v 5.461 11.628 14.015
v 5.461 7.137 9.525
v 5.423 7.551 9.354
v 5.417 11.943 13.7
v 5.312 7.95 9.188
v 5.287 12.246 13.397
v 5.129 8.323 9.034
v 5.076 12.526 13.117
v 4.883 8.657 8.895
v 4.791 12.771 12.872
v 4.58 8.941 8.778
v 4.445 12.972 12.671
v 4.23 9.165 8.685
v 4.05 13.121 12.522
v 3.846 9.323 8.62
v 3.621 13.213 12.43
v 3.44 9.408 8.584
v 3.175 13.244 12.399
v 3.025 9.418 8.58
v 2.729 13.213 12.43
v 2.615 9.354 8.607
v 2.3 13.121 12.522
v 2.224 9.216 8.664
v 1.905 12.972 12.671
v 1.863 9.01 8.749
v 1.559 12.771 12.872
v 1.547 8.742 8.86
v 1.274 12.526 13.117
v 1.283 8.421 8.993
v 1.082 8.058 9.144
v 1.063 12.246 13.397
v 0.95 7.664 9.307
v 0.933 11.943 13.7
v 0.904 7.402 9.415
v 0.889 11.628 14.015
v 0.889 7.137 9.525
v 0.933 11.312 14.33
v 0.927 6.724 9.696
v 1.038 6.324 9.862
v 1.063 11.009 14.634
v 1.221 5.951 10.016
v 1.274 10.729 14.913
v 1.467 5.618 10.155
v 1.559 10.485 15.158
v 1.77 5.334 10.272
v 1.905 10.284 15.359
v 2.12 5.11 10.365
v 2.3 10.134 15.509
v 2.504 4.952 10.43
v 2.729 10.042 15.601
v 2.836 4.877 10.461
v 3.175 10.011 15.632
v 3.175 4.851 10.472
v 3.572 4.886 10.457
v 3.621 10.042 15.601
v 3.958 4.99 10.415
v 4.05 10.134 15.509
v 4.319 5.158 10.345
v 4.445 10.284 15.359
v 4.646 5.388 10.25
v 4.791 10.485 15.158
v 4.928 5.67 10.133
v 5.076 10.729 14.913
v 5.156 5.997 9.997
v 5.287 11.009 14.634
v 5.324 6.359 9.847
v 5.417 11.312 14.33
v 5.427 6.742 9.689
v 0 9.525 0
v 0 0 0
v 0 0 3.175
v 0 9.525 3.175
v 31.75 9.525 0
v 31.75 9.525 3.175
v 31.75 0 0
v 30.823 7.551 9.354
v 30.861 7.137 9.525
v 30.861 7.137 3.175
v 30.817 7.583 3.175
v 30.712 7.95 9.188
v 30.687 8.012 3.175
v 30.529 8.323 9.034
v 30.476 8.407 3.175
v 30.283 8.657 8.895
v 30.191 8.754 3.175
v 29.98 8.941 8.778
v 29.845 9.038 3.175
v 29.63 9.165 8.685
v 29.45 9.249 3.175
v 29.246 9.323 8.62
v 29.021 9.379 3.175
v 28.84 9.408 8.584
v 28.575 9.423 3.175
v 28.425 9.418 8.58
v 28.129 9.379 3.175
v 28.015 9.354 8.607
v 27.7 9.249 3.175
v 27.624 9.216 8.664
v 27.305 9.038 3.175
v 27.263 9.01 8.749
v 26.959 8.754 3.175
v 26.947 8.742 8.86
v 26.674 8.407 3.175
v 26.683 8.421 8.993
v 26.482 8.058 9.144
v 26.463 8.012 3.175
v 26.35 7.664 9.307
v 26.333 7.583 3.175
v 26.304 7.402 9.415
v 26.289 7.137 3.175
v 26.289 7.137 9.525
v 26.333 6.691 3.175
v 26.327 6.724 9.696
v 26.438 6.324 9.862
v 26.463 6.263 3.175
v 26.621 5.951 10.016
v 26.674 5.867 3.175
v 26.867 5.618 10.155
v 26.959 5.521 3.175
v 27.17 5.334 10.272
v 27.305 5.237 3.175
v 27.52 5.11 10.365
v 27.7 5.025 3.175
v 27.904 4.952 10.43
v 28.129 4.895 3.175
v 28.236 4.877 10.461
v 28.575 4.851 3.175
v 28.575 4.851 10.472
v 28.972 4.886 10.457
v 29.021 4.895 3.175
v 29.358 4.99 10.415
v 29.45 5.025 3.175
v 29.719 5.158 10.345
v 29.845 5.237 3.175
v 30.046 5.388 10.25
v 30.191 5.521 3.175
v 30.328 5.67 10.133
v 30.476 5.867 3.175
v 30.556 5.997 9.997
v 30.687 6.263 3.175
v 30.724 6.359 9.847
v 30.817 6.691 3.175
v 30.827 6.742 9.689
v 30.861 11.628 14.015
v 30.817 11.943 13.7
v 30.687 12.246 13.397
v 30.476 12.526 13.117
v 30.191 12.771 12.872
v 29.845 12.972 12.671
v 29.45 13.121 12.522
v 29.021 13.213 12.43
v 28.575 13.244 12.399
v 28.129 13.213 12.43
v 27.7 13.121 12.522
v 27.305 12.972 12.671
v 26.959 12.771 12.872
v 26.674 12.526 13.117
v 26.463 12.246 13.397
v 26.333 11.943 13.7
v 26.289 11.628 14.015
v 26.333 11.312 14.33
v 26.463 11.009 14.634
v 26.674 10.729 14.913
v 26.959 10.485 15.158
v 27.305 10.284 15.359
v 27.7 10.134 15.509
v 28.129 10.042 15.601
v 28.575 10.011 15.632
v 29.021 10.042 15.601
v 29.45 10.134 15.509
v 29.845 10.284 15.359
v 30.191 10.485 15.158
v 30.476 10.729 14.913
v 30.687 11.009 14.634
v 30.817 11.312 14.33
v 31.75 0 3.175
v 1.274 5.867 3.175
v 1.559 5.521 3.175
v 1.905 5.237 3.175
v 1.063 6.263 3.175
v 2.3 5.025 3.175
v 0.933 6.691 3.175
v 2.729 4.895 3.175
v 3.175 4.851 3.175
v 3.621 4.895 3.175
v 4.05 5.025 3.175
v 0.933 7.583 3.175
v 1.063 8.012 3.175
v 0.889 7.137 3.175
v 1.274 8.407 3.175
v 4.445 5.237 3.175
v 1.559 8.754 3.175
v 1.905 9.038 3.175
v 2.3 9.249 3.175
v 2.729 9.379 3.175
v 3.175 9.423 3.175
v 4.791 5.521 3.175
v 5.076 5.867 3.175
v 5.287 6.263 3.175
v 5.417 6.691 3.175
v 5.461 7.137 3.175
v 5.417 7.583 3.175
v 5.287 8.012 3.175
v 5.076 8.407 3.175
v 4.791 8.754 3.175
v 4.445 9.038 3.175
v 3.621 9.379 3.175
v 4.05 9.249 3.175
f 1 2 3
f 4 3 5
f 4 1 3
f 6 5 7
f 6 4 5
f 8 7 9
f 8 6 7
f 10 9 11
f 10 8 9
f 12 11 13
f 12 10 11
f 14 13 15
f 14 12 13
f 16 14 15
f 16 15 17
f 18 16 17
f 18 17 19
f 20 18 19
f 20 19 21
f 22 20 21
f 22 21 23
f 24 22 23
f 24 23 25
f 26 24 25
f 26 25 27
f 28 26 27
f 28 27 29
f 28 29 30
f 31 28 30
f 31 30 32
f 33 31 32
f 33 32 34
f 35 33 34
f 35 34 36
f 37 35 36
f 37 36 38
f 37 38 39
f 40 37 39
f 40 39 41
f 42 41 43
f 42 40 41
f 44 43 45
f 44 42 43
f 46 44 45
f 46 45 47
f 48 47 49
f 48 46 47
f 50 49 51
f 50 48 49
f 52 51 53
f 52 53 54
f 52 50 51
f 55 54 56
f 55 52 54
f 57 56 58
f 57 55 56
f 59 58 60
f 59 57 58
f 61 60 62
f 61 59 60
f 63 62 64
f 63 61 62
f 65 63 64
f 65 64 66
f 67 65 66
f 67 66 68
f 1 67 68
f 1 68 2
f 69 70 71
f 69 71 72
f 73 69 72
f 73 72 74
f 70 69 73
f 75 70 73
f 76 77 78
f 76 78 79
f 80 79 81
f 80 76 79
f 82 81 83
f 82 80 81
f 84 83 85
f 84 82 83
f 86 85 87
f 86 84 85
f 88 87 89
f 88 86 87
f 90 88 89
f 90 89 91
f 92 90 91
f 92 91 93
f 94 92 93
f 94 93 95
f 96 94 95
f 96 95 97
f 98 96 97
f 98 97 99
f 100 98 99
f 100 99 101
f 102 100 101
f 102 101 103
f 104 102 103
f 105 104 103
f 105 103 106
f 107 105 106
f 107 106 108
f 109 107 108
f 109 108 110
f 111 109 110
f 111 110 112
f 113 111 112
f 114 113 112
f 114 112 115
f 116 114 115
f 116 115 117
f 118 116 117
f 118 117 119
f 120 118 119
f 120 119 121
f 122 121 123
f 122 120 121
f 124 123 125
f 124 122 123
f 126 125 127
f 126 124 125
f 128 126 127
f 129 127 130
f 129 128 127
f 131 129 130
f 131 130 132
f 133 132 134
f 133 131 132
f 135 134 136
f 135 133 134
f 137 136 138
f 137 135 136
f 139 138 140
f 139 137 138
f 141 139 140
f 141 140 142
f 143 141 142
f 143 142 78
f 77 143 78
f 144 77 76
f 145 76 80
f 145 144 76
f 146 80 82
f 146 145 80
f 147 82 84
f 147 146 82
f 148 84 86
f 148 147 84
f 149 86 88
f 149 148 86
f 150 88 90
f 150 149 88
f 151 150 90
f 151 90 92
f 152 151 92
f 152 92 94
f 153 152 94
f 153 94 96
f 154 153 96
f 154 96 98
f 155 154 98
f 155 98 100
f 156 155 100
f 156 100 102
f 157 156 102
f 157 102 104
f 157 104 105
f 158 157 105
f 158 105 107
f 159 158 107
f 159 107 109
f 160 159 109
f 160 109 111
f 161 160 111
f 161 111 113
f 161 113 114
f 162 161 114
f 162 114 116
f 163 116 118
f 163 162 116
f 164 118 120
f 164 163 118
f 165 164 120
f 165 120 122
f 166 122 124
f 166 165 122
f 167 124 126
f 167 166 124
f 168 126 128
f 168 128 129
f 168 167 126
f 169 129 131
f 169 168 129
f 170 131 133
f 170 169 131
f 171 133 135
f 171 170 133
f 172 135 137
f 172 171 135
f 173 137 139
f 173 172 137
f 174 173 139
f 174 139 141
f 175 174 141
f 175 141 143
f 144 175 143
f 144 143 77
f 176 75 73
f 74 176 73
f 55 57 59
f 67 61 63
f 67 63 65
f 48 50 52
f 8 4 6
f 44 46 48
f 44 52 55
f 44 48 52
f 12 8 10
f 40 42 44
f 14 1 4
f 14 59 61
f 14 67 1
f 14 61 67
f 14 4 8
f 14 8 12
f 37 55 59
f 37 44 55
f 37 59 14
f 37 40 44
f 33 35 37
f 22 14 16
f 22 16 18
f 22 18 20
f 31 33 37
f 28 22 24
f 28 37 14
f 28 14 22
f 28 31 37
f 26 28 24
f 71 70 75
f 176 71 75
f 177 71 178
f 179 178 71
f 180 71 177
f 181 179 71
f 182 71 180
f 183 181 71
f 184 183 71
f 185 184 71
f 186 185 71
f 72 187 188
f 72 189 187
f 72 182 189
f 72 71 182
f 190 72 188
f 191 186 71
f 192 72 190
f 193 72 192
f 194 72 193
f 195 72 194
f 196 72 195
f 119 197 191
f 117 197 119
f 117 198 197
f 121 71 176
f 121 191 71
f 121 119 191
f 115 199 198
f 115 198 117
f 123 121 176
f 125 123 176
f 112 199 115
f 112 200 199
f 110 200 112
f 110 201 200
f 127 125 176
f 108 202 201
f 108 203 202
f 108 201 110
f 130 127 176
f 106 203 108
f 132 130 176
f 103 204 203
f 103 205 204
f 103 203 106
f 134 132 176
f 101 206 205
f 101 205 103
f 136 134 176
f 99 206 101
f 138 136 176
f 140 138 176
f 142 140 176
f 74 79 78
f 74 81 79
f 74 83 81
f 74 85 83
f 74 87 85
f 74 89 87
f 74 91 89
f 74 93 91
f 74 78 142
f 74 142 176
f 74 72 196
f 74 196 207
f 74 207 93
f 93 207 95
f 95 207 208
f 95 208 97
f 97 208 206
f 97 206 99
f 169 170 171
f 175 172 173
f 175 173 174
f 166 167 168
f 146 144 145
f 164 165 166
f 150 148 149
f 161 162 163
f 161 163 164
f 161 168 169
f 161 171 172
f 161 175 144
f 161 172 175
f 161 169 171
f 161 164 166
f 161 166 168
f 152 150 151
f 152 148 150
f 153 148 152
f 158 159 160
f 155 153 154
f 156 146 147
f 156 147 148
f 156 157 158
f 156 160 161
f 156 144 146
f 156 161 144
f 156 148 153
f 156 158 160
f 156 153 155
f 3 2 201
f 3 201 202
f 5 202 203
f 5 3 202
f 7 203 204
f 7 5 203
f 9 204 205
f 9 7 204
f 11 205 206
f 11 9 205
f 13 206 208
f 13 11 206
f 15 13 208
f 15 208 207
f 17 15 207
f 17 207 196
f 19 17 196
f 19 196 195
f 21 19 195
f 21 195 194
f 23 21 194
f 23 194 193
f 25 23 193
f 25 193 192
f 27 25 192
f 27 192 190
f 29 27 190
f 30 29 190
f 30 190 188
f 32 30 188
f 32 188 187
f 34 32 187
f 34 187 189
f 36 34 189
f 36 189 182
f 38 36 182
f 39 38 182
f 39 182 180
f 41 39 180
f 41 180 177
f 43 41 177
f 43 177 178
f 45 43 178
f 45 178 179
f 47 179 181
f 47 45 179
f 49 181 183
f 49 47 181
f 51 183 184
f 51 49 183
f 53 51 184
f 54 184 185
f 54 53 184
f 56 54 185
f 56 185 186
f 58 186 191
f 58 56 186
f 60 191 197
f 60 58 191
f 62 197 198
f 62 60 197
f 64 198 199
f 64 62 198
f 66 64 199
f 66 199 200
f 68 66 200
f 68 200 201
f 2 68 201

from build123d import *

# Parameters (mm, degrees)
F0_W     = 31.75
F0_H     = 9.525
F1_DEPTH = 3.175
F4_R     = 2.286
F8_R     = 2.286


with BuildPart() as f1:
    # F0 (on Top) → F1 (new body)
    with BuildSketch(Plane.XY):
        with Locations((15.875, 4.7625)):
            Rectangle(F0_W, F0_H)
    extrude(amount=F1_DEPTH)

    # F5: sweep along a path in F3
    with BuildLine(Plane.YZ.offset(28.575)) as f5_path:
        Line((7.1374, 3.175), (7.1374, 9.525))
        Line((7.1374, 9.525), (11.6275280605, 14.0151280605))
    # F4 (on face) → F5 (sweep)
    with BuildSketch(Plane.XY.offset(3.175)):
        with Locations((28.575, 7.1374)):
            Circle(F4_R)
    sweep(path=f5_path.line, transition=Transition.RIGHT)

    # F9: sweep along a path in F7
    with BuildLine(Plane.YZ.offset(3.175)) as f9_path:
        Line((7.1374, 3.175), (7.1374, 9.525))
        Line((7.1374, 9.525), (11.6275280605, 14.0151280605))
    # F8 (on face) → F9 (sweep)
    with BuildSketch(Plane.XY.offset(3.175)):
        with Locations((3.175, 7.1374)):
            Circle(F8_R)
    sweep(path=f9_path.line, transition=Transition.RIGHT)


solid = f1.part
